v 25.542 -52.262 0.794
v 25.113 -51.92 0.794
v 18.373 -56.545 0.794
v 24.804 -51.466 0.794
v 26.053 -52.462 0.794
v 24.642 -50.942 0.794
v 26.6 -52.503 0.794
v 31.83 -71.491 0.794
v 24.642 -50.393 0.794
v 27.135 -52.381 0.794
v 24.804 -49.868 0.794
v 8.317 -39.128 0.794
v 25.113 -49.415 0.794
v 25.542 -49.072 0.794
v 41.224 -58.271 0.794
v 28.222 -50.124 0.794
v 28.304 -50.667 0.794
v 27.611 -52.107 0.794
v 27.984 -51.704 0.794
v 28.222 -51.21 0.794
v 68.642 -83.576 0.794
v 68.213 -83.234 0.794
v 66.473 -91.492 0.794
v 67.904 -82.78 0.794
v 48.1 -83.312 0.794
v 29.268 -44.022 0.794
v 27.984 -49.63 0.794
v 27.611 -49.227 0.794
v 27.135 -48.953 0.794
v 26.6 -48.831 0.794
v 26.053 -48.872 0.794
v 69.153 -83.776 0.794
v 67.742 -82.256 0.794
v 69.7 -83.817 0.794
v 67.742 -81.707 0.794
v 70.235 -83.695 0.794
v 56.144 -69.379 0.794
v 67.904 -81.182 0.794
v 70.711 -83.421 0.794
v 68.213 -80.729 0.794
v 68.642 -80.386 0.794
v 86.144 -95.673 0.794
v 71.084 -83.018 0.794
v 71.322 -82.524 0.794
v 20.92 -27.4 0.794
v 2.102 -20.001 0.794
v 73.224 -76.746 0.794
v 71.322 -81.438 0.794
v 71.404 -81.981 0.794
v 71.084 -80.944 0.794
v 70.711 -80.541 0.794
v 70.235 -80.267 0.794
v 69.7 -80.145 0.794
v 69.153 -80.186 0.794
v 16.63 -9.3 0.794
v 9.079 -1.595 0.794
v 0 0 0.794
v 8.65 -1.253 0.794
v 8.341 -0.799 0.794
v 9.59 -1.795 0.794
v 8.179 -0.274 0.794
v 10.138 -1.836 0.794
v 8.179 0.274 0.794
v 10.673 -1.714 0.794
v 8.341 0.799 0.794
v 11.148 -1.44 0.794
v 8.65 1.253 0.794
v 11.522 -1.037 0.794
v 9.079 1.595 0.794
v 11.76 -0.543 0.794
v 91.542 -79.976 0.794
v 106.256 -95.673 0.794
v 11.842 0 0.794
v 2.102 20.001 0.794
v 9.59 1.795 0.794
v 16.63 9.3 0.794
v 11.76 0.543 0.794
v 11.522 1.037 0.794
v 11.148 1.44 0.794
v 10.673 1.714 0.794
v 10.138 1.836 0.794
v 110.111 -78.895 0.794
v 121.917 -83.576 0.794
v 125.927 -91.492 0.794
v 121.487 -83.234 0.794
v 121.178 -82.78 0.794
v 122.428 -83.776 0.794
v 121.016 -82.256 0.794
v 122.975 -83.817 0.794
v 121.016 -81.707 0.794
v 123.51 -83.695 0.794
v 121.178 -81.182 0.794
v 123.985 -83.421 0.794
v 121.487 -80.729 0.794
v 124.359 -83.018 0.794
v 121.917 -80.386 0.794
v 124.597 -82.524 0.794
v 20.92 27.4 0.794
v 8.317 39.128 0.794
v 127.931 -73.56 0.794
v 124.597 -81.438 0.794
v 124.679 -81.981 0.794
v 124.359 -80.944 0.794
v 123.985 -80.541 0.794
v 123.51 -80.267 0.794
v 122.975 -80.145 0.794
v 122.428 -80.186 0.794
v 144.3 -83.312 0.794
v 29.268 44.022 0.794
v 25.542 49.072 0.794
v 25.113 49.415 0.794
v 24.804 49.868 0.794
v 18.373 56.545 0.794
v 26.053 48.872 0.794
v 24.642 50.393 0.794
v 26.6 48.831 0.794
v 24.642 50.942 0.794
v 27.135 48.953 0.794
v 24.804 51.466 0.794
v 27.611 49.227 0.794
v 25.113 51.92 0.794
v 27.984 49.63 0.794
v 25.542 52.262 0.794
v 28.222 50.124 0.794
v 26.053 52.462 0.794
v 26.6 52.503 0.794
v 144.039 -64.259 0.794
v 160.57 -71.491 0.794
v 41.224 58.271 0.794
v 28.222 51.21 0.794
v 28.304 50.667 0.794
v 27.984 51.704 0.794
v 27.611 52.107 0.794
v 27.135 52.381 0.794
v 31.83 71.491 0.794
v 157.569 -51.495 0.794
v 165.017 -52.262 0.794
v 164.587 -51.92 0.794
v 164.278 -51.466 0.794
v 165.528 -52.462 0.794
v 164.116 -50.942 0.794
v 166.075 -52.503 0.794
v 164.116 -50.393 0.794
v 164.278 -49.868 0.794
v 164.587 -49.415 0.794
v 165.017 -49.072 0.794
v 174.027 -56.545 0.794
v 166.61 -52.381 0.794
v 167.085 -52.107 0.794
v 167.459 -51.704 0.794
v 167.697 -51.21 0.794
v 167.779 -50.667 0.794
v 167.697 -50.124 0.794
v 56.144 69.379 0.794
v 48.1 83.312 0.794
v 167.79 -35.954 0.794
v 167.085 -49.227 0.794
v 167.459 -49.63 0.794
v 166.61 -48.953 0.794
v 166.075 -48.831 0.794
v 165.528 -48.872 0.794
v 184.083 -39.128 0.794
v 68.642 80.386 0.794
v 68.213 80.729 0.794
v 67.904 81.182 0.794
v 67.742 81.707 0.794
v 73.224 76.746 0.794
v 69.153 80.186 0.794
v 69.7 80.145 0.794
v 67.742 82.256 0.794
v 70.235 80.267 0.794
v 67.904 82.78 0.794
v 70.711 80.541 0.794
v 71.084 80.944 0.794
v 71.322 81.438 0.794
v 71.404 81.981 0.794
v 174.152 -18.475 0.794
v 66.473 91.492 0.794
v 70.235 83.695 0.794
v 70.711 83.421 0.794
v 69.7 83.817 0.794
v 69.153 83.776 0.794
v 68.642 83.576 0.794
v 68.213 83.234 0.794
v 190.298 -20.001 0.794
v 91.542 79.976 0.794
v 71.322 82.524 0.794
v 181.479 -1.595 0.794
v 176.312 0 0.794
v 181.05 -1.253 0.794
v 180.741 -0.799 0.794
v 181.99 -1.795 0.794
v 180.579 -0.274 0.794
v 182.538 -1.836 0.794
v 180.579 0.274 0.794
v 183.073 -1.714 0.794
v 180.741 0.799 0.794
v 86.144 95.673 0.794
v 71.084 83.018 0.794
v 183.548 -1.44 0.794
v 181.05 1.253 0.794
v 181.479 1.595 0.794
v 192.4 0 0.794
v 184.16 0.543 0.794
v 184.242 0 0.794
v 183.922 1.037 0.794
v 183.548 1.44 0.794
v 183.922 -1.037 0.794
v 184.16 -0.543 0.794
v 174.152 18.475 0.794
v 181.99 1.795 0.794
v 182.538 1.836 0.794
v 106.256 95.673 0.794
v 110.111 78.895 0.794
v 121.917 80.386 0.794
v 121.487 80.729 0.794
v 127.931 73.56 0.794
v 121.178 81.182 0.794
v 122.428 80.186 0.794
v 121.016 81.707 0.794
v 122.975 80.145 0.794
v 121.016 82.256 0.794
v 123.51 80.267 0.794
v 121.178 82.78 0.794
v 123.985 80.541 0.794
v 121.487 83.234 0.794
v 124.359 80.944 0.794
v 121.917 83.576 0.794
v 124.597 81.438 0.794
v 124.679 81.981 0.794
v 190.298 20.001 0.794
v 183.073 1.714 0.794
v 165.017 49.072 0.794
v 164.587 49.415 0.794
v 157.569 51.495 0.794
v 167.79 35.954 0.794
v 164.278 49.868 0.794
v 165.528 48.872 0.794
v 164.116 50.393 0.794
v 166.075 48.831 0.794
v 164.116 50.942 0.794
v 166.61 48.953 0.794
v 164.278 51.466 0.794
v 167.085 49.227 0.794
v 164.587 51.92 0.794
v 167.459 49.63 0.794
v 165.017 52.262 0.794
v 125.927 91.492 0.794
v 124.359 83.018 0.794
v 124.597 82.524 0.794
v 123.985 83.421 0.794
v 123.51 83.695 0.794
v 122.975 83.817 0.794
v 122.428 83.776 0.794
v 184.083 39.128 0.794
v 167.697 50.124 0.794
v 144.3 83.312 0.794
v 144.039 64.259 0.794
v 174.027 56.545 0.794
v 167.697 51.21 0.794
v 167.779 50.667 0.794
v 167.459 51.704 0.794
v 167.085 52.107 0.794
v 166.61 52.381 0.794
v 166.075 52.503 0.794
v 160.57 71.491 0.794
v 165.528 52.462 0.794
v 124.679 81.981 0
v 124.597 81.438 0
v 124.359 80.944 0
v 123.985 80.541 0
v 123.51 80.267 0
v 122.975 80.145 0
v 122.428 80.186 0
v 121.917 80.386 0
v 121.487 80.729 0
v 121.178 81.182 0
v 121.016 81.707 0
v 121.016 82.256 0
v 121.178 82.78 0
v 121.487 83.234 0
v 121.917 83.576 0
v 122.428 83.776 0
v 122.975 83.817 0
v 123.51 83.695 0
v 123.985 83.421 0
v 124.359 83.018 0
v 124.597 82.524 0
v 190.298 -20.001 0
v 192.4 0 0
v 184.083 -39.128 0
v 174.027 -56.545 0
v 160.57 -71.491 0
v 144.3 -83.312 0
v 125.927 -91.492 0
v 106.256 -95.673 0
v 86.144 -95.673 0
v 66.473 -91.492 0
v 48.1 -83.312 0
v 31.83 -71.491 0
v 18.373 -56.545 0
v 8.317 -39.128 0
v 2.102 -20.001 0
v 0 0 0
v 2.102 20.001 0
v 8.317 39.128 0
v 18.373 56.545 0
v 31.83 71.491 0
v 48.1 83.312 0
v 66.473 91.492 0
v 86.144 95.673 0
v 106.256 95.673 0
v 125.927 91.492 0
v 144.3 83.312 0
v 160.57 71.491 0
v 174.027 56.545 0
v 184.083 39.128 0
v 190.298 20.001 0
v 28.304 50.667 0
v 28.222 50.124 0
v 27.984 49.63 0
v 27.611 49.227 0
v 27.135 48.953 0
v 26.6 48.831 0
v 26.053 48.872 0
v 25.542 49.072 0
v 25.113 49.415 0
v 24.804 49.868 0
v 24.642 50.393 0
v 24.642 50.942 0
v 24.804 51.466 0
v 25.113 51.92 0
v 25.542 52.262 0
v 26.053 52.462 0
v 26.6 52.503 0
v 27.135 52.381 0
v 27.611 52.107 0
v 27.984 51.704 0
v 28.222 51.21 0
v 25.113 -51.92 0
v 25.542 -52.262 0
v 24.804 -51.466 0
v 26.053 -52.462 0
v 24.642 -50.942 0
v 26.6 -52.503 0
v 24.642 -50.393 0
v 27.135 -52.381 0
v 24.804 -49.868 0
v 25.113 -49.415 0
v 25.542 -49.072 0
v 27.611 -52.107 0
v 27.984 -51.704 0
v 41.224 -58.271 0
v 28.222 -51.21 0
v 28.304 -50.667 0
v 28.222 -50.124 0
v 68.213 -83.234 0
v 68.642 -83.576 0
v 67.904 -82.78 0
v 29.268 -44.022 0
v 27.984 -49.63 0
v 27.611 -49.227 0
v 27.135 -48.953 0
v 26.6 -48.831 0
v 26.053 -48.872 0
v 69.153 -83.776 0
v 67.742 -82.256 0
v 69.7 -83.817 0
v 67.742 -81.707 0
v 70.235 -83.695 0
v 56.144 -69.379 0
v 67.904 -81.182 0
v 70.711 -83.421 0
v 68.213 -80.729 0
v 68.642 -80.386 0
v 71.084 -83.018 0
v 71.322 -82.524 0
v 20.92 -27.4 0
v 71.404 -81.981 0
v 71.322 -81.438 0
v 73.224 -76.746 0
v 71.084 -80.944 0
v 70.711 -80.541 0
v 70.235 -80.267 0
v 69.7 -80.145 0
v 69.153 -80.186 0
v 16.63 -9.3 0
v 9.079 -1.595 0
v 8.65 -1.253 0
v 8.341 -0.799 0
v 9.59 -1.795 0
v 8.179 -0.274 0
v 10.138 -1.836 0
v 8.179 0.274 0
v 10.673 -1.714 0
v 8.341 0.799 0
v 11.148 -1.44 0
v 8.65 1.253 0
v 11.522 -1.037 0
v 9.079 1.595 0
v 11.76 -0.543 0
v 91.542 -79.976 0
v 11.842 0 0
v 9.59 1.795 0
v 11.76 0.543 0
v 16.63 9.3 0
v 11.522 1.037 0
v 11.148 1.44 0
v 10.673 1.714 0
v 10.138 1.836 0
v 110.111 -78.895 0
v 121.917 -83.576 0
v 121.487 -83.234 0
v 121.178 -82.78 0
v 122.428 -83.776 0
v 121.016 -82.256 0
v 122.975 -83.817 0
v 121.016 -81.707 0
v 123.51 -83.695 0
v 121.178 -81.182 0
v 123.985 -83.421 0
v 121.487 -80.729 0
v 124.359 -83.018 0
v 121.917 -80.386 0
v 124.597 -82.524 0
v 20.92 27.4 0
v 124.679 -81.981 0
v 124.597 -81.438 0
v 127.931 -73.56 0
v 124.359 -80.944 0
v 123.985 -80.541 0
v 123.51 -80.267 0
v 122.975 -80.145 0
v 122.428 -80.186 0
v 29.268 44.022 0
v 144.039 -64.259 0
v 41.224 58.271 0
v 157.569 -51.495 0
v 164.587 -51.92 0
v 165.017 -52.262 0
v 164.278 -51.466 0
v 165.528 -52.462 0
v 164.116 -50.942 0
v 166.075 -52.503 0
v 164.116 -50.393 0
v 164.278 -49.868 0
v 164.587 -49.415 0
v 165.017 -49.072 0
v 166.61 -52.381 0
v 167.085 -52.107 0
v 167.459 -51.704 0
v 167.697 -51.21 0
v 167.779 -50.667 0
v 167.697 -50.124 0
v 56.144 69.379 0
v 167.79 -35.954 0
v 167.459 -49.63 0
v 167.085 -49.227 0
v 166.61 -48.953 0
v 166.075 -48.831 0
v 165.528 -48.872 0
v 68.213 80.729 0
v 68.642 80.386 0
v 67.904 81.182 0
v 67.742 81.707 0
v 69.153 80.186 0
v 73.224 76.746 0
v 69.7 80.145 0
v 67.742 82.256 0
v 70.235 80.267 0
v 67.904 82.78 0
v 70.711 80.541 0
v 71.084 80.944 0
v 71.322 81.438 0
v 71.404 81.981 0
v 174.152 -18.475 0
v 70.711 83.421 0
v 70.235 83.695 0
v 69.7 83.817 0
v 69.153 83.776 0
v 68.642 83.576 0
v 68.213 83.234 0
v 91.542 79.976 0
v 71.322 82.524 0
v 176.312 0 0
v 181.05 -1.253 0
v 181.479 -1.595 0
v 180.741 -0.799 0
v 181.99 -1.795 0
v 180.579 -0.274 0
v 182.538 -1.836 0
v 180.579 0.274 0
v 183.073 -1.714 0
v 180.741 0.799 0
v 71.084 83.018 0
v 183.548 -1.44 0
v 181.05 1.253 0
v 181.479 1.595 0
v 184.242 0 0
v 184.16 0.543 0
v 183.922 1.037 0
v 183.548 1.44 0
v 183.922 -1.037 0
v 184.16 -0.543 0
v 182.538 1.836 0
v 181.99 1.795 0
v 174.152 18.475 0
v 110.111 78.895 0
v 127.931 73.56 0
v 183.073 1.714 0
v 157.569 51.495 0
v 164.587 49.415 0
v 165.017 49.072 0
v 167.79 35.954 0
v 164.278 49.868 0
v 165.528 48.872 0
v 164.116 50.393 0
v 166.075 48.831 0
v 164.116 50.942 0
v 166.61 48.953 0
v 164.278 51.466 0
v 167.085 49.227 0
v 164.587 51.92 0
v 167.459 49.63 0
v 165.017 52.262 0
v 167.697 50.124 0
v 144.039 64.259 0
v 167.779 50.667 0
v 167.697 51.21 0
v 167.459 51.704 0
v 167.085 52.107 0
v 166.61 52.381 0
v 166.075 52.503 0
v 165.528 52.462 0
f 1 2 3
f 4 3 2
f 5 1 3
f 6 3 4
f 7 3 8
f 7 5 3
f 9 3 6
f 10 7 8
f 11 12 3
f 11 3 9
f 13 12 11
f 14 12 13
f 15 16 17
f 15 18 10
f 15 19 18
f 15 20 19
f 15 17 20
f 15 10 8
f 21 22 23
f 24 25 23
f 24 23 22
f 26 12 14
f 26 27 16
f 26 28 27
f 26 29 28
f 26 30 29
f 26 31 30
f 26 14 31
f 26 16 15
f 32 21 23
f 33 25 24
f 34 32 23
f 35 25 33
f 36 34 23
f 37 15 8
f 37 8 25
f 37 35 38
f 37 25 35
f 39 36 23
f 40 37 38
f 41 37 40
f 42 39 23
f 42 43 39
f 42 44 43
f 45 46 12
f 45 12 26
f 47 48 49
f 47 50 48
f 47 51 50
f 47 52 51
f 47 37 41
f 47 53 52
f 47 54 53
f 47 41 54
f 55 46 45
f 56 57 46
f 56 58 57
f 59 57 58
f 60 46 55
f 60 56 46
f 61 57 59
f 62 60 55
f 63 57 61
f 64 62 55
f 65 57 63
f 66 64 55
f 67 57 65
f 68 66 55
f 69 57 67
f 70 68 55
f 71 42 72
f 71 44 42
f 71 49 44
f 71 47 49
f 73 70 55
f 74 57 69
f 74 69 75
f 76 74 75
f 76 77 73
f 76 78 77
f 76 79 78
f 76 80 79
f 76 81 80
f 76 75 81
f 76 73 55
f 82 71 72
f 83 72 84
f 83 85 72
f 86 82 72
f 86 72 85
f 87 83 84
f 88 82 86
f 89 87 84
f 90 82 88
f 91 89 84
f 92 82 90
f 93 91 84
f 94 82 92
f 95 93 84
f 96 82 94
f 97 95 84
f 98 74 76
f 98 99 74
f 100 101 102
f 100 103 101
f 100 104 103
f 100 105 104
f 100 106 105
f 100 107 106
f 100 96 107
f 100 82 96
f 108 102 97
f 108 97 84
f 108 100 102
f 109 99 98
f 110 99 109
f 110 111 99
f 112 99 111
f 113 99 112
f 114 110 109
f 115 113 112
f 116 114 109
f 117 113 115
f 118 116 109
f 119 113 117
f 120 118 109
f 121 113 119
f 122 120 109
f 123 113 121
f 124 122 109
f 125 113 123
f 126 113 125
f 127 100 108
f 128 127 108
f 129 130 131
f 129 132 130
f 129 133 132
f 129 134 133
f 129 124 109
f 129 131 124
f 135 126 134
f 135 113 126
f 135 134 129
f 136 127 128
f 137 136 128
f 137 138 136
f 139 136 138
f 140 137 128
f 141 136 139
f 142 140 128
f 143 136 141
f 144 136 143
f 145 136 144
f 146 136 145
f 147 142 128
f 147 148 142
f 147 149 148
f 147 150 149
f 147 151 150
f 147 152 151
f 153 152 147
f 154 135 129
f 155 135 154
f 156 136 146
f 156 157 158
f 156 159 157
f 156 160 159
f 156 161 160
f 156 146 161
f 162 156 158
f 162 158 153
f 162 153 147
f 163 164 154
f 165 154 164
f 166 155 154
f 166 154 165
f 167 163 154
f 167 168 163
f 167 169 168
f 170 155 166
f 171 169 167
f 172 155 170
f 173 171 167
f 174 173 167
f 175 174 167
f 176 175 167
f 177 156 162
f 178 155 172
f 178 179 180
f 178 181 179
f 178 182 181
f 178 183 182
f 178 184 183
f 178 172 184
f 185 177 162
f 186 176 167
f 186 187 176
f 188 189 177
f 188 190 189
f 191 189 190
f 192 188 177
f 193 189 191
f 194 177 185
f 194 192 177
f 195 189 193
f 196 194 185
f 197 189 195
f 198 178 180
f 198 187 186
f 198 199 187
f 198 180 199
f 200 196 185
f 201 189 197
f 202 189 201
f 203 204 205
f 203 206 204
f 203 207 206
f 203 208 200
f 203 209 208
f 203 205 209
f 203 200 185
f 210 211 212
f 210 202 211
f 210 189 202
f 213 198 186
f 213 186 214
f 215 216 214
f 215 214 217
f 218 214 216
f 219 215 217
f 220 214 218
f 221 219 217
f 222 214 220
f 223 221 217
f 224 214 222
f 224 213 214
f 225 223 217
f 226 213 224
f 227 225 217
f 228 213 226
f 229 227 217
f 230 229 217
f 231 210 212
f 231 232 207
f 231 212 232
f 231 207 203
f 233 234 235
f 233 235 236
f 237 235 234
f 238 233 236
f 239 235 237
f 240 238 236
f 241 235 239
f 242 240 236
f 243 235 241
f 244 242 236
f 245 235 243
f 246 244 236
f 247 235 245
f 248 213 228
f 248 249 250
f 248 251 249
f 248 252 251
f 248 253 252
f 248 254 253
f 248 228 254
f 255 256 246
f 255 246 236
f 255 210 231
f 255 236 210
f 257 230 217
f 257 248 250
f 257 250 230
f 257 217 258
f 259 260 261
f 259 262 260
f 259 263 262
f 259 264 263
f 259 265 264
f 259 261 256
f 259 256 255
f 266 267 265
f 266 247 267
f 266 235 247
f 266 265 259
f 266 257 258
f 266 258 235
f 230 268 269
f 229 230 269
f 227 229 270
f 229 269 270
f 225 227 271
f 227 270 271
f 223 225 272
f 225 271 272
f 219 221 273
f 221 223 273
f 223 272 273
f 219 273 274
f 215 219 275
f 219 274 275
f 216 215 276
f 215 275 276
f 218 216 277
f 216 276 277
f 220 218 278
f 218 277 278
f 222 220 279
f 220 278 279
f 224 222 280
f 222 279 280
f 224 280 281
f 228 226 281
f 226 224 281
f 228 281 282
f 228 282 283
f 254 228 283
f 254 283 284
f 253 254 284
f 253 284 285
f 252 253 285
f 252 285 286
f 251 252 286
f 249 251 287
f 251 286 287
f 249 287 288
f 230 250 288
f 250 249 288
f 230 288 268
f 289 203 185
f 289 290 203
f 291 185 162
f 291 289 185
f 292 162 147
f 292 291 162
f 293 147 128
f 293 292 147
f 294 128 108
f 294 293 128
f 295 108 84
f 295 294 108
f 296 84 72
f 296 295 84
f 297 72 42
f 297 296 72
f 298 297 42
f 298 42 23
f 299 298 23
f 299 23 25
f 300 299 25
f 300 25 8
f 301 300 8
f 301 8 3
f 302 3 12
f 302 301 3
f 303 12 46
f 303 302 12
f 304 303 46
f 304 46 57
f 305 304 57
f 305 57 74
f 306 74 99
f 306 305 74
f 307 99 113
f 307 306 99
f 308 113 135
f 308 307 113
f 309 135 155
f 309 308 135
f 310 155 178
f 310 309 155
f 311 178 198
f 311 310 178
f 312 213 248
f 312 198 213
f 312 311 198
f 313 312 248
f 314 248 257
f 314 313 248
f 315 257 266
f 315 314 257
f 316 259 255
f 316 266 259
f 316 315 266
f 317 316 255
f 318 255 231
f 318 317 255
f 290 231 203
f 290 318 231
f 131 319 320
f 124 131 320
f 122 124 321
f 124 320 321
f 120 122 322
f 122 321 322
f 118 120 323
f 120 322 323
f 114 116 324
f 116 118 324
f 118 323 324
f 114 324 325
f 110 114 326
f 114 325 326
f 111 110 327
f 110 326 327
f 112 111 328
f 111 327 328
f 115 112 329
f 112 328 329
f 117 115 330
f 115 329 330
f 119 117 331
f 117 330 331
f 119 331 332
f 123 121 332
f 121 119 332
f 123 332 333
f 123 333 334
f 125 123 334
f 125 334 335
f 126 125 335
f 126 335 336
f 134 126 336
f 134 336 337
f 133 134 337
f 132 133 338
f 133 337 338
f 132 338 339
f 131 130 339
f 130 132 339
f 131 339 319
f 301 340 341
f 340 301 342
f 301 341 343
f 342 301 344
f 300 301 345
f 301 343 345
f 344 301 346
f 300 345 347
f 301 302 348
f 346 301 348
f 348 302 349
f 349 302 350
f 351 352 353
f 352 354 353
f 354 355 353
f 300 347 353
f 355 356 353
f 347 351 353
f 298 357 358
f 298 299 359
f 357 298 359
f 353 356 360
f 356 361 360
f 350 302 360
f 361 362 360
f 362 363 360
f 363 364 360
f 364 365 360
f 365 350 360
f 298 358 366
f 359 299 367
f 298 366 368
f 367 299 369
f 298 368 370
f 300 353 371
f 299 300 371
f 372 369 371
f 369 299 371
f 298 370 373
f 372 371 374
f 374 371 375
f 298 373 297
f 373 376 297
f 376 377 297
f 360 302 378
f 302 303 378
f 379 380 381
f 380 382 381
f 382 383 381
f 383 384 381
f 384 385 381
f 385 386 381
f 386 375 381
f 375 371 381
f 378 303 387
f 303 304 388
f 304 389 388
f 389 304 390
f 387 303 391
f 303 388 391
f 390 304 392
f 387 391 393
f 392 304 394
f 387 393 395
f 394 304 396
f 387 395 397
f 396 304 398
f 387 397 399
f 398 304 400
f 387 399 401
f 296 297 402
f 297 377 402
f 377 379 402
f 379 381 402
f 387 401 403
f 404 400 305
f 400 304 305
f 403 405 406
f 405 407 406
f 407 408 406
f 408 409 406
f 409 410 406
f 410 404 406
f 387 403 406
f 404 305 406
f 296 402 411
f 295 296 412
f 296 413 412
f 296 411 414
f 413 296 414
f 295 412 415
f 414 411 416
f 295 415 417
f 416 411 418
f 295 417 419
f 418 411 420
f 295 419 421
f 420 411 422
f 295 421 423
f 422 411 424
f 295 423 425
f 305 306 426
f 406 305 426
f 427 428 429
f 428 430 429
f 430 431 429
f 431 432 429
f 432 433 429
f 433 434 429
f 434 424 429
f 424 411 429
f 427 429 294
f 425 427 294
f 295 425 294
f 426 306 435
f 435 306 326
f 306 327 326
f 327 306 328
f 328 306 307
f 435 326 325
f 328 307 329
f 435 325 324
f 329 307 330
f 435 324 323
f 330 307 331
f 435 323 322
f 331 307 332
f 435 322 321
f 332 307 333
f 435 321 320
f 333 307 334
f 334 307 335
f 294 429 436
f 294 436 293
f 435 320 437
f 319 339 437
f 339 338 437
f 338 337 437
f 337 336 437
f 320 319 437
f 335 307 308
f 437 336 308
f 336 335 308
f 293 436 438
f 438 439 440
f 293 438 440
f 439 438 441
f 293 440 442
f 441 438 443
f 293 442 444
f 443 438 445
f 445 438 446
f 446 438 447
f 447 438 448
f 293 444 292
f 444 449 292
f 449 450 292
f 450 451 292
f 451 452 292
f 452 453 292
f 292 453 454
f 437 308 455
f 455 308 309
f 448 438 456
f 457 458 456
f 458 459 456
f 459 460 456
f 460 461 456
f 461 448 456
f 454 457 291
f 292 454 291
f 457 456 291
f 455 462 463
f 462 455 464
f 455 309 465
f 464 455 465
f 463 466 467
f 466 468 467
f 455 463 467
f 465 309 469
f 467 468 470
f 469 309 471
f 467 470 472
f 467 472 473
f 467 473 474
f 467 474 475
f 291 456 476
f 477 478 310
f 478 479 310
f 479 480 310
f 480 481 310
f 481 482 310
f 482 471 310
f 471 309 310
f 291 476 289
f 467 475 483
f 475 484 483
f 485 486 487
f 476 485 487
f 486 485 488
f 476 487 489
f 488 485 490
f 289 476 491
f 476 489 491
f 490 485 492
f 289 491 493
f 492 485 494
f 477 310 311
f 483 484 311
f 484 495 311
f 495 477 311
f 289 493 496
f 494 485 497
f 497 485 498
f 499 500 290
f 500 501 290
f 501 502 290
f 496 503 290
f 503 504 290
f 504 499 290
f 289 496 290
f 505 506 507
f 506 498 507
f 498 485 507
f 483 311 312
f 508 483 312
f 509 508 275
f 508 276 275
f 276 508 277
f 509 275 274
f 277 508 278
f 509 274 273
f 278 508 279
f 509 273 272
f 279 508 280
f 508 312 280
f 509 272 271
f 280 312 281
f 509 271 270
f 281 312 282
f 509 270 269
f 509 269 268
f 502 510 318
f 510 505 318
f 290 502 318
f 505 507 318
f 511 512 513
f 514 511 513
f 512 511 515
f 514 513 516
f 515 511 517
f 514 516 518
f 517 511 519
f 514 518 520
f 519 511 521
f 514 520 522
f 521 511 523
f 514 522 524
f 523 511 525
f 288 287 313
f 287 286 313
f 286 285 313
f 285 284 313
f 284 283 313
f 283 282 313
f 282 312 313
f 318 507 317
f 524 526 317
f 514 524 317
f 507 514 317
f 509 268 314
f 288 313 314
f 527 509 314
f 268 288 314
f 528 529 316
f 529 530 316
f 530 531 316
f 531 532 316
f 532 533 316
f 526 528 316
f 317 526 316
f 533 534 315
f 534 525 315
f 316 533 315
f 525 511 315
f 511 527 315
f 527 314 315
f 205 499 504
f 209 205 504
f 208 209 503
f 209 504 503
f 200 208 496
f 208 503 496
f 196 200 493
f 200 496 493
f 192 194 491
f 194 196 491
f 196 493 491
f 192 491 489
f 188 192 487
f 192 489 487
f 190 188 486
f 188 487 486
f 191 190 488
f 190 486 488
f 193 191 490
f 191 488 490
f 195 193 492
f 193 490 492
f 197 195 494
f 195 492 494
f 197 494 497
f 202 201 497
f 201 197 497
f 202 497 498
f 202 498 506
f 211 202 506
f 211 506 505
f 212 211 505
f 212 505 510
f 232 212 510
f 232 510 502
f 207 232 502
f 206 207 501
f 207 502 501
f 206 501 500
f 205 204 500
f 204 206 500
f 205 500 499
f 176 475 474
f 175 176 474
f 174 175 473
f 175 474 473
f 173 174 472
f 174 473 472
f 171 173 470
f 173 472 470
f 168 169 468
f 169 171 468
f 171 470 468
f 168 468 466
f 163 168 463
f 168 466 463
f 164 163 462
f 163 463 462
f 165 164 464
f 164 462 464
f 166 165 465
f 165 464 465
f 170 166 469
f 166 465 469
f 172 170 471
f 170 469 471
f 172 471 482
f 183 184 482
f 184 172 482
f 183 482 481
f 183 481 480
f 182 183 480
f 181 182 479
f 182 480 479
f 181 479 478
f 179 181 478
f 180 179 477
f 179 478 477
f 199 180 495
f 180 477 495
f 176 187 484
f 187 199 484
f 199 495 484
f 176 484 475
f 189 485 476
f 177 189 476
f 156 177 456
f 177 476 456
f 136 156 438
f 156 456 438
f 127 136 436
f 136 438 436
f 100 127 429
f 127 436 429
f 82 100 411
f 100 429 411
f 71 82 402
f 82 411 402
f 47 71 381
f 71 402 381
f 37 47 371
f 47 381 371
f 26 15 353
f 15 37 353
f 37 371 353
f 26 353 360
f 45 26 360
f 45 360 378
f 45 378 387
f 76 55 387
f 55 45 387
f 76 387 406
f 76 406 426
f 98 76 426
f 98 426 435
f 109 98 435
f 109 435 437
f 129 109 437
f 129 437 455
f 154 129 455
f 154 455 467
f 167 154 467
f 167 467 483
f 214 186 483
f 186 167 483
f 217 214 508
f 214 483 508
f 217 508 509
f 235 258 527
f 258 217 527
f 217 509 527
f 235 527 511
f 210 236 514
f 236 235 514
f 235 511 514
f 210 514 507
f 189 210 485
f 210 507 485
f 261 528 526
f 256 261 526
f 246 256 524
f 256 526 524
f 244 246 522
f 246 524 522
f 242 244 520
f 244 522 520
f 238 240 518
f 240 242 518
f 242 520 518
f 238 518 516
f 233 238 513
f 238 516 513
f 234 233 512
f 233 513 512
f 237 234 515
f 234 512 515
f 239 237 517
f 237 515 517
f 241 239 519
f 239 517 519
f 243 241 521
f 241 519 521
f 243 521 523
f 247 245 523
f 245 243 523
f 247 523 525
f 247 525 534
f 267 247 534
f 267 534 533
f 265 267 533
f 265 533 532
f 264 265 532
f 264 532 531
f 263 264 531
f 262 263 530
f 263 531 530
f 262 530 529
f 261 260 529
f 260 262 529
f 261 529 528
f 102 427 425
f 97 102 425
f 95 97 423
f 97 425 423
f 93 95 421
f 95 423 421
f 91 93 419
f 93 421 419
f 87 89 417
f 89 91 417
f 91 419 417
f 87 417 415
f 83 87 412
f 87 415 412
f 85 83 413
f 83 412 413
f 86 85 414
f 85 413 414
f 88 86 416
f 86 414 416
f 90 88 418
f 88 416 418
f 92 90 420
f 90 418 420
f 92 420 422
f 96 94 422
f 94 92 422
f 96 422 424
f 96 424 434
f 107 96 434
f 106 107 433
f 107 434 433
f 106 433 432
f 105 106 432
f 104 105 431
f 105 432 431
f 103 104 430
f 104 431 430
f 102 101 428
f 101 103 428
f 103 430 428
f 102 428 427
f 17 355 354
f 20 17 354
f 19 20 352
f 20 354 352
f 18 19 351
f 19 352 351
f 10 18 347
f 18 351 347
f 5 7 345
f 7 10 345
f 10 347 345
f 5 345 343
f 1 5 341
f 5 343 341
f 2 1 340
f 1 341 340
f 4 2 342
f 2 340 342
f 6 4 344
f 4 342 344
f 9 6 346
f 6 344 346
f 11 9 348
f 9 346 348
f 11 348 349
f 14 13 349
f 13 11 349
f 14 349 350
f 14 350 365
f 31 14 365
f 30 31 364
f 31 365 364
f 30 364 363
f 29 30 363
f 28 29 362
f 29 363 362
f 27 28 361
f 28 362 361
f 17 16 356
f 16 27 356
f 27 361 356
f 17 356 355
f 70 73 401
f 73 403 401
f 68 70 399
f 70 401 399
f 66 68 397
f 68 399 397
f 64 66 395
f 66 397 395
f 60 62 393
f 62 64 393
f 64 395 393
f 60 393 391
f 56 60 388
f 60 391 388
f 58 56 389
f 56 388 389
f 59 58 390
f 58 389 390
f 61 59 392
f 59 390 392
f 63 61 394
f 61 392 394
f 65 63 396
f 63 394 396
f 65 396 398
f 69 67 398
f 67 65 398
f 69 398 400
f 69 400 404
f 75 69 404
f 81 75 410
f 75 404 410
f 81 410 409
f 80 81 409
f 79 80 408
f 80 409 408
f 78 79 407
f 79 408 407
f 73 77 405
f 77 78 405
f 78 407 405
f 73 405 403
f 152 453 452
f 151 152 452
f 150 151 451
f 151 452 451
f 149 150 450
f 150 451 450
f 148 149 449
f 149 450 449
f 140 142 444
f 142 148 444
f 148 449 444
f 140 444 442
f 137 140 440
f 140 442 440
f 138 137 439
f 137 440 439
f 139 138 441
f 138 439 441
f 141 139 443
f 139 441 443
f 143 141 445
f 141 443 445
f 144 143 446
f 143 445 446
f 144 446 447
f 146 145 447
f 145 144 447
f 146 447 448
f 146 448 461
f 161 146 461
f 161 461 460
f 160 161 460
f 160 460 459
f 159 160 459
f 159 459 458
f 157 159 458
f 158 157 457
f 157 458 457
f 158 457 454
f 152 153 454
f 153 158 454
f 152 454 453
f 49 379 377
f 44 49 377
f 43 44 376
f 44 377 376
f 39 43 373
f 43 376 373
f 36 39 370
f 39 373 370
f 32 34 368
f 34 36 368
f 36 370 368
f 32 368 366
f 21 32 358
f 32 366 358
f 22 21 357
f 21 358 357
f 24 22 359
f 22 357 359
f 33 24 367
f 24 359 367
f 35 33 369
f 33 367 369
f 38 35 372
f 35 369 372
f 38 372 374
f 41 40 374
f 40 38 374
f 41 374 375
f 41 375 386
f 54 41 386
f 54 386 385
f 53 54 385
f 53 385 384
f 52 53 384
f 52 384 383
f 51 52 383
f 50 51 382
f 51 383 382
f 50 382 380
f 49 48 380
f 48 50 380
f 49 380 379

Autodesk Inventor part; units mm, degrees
ref_plane "YZ Plane" through (0, 0, 0) normal (1, 0, 0) x (0, 1, 0)
ref_plane "XZ Plane" through (0, 0, 0) normal (0, 1, 0) x (-1, 0, 0)
ref_plane "Work Plane1" through (0, 0, 0) normal (0, 0, 1) x (1, 0, 0)
sketch "Sketch1" plane through (0, 0, 0) normal (0, 0, 1) x (1, 0, 0)
  circle A0 centre (26.4627, -50.6671) radius 1.8415 projected
  circle A1 centre (69.5627, -81.9811) radius 1.8415 projected
  circle A2 centre (122.8373, -81.9811) radius 1.8415 projected
  circle A3 centre (165.9373, -50.6671) radius 1.8415 projected
  circle A4 centre (182.4, 0) radius 1.8415 projected
  circle A5 centre (165.9373, 50.6671) radius 1.8415 projected
  circle A6 centre (122.8373, 81.9811) radius 1.8415 projected
  circle A7 centre (69.5627, 81.9811) radius 1.8415 projected
  circle A8 centre (26.4627, 50.6671) radius 1.8415 projected
  circle A9 centre (10, 0) radius 1.8415 projected
  circle A10 centre (96.2, 0) radius 80.1116 projected
  circle A11 centre (96.2, 0) radius 96.2 projected
  point P0 (0, 0)
extrude "Extrusion1" add sketch "Sketch1" along normal blind 0.7937
properties part number "1139_Outer Gasket_V1" material "Rubber"
